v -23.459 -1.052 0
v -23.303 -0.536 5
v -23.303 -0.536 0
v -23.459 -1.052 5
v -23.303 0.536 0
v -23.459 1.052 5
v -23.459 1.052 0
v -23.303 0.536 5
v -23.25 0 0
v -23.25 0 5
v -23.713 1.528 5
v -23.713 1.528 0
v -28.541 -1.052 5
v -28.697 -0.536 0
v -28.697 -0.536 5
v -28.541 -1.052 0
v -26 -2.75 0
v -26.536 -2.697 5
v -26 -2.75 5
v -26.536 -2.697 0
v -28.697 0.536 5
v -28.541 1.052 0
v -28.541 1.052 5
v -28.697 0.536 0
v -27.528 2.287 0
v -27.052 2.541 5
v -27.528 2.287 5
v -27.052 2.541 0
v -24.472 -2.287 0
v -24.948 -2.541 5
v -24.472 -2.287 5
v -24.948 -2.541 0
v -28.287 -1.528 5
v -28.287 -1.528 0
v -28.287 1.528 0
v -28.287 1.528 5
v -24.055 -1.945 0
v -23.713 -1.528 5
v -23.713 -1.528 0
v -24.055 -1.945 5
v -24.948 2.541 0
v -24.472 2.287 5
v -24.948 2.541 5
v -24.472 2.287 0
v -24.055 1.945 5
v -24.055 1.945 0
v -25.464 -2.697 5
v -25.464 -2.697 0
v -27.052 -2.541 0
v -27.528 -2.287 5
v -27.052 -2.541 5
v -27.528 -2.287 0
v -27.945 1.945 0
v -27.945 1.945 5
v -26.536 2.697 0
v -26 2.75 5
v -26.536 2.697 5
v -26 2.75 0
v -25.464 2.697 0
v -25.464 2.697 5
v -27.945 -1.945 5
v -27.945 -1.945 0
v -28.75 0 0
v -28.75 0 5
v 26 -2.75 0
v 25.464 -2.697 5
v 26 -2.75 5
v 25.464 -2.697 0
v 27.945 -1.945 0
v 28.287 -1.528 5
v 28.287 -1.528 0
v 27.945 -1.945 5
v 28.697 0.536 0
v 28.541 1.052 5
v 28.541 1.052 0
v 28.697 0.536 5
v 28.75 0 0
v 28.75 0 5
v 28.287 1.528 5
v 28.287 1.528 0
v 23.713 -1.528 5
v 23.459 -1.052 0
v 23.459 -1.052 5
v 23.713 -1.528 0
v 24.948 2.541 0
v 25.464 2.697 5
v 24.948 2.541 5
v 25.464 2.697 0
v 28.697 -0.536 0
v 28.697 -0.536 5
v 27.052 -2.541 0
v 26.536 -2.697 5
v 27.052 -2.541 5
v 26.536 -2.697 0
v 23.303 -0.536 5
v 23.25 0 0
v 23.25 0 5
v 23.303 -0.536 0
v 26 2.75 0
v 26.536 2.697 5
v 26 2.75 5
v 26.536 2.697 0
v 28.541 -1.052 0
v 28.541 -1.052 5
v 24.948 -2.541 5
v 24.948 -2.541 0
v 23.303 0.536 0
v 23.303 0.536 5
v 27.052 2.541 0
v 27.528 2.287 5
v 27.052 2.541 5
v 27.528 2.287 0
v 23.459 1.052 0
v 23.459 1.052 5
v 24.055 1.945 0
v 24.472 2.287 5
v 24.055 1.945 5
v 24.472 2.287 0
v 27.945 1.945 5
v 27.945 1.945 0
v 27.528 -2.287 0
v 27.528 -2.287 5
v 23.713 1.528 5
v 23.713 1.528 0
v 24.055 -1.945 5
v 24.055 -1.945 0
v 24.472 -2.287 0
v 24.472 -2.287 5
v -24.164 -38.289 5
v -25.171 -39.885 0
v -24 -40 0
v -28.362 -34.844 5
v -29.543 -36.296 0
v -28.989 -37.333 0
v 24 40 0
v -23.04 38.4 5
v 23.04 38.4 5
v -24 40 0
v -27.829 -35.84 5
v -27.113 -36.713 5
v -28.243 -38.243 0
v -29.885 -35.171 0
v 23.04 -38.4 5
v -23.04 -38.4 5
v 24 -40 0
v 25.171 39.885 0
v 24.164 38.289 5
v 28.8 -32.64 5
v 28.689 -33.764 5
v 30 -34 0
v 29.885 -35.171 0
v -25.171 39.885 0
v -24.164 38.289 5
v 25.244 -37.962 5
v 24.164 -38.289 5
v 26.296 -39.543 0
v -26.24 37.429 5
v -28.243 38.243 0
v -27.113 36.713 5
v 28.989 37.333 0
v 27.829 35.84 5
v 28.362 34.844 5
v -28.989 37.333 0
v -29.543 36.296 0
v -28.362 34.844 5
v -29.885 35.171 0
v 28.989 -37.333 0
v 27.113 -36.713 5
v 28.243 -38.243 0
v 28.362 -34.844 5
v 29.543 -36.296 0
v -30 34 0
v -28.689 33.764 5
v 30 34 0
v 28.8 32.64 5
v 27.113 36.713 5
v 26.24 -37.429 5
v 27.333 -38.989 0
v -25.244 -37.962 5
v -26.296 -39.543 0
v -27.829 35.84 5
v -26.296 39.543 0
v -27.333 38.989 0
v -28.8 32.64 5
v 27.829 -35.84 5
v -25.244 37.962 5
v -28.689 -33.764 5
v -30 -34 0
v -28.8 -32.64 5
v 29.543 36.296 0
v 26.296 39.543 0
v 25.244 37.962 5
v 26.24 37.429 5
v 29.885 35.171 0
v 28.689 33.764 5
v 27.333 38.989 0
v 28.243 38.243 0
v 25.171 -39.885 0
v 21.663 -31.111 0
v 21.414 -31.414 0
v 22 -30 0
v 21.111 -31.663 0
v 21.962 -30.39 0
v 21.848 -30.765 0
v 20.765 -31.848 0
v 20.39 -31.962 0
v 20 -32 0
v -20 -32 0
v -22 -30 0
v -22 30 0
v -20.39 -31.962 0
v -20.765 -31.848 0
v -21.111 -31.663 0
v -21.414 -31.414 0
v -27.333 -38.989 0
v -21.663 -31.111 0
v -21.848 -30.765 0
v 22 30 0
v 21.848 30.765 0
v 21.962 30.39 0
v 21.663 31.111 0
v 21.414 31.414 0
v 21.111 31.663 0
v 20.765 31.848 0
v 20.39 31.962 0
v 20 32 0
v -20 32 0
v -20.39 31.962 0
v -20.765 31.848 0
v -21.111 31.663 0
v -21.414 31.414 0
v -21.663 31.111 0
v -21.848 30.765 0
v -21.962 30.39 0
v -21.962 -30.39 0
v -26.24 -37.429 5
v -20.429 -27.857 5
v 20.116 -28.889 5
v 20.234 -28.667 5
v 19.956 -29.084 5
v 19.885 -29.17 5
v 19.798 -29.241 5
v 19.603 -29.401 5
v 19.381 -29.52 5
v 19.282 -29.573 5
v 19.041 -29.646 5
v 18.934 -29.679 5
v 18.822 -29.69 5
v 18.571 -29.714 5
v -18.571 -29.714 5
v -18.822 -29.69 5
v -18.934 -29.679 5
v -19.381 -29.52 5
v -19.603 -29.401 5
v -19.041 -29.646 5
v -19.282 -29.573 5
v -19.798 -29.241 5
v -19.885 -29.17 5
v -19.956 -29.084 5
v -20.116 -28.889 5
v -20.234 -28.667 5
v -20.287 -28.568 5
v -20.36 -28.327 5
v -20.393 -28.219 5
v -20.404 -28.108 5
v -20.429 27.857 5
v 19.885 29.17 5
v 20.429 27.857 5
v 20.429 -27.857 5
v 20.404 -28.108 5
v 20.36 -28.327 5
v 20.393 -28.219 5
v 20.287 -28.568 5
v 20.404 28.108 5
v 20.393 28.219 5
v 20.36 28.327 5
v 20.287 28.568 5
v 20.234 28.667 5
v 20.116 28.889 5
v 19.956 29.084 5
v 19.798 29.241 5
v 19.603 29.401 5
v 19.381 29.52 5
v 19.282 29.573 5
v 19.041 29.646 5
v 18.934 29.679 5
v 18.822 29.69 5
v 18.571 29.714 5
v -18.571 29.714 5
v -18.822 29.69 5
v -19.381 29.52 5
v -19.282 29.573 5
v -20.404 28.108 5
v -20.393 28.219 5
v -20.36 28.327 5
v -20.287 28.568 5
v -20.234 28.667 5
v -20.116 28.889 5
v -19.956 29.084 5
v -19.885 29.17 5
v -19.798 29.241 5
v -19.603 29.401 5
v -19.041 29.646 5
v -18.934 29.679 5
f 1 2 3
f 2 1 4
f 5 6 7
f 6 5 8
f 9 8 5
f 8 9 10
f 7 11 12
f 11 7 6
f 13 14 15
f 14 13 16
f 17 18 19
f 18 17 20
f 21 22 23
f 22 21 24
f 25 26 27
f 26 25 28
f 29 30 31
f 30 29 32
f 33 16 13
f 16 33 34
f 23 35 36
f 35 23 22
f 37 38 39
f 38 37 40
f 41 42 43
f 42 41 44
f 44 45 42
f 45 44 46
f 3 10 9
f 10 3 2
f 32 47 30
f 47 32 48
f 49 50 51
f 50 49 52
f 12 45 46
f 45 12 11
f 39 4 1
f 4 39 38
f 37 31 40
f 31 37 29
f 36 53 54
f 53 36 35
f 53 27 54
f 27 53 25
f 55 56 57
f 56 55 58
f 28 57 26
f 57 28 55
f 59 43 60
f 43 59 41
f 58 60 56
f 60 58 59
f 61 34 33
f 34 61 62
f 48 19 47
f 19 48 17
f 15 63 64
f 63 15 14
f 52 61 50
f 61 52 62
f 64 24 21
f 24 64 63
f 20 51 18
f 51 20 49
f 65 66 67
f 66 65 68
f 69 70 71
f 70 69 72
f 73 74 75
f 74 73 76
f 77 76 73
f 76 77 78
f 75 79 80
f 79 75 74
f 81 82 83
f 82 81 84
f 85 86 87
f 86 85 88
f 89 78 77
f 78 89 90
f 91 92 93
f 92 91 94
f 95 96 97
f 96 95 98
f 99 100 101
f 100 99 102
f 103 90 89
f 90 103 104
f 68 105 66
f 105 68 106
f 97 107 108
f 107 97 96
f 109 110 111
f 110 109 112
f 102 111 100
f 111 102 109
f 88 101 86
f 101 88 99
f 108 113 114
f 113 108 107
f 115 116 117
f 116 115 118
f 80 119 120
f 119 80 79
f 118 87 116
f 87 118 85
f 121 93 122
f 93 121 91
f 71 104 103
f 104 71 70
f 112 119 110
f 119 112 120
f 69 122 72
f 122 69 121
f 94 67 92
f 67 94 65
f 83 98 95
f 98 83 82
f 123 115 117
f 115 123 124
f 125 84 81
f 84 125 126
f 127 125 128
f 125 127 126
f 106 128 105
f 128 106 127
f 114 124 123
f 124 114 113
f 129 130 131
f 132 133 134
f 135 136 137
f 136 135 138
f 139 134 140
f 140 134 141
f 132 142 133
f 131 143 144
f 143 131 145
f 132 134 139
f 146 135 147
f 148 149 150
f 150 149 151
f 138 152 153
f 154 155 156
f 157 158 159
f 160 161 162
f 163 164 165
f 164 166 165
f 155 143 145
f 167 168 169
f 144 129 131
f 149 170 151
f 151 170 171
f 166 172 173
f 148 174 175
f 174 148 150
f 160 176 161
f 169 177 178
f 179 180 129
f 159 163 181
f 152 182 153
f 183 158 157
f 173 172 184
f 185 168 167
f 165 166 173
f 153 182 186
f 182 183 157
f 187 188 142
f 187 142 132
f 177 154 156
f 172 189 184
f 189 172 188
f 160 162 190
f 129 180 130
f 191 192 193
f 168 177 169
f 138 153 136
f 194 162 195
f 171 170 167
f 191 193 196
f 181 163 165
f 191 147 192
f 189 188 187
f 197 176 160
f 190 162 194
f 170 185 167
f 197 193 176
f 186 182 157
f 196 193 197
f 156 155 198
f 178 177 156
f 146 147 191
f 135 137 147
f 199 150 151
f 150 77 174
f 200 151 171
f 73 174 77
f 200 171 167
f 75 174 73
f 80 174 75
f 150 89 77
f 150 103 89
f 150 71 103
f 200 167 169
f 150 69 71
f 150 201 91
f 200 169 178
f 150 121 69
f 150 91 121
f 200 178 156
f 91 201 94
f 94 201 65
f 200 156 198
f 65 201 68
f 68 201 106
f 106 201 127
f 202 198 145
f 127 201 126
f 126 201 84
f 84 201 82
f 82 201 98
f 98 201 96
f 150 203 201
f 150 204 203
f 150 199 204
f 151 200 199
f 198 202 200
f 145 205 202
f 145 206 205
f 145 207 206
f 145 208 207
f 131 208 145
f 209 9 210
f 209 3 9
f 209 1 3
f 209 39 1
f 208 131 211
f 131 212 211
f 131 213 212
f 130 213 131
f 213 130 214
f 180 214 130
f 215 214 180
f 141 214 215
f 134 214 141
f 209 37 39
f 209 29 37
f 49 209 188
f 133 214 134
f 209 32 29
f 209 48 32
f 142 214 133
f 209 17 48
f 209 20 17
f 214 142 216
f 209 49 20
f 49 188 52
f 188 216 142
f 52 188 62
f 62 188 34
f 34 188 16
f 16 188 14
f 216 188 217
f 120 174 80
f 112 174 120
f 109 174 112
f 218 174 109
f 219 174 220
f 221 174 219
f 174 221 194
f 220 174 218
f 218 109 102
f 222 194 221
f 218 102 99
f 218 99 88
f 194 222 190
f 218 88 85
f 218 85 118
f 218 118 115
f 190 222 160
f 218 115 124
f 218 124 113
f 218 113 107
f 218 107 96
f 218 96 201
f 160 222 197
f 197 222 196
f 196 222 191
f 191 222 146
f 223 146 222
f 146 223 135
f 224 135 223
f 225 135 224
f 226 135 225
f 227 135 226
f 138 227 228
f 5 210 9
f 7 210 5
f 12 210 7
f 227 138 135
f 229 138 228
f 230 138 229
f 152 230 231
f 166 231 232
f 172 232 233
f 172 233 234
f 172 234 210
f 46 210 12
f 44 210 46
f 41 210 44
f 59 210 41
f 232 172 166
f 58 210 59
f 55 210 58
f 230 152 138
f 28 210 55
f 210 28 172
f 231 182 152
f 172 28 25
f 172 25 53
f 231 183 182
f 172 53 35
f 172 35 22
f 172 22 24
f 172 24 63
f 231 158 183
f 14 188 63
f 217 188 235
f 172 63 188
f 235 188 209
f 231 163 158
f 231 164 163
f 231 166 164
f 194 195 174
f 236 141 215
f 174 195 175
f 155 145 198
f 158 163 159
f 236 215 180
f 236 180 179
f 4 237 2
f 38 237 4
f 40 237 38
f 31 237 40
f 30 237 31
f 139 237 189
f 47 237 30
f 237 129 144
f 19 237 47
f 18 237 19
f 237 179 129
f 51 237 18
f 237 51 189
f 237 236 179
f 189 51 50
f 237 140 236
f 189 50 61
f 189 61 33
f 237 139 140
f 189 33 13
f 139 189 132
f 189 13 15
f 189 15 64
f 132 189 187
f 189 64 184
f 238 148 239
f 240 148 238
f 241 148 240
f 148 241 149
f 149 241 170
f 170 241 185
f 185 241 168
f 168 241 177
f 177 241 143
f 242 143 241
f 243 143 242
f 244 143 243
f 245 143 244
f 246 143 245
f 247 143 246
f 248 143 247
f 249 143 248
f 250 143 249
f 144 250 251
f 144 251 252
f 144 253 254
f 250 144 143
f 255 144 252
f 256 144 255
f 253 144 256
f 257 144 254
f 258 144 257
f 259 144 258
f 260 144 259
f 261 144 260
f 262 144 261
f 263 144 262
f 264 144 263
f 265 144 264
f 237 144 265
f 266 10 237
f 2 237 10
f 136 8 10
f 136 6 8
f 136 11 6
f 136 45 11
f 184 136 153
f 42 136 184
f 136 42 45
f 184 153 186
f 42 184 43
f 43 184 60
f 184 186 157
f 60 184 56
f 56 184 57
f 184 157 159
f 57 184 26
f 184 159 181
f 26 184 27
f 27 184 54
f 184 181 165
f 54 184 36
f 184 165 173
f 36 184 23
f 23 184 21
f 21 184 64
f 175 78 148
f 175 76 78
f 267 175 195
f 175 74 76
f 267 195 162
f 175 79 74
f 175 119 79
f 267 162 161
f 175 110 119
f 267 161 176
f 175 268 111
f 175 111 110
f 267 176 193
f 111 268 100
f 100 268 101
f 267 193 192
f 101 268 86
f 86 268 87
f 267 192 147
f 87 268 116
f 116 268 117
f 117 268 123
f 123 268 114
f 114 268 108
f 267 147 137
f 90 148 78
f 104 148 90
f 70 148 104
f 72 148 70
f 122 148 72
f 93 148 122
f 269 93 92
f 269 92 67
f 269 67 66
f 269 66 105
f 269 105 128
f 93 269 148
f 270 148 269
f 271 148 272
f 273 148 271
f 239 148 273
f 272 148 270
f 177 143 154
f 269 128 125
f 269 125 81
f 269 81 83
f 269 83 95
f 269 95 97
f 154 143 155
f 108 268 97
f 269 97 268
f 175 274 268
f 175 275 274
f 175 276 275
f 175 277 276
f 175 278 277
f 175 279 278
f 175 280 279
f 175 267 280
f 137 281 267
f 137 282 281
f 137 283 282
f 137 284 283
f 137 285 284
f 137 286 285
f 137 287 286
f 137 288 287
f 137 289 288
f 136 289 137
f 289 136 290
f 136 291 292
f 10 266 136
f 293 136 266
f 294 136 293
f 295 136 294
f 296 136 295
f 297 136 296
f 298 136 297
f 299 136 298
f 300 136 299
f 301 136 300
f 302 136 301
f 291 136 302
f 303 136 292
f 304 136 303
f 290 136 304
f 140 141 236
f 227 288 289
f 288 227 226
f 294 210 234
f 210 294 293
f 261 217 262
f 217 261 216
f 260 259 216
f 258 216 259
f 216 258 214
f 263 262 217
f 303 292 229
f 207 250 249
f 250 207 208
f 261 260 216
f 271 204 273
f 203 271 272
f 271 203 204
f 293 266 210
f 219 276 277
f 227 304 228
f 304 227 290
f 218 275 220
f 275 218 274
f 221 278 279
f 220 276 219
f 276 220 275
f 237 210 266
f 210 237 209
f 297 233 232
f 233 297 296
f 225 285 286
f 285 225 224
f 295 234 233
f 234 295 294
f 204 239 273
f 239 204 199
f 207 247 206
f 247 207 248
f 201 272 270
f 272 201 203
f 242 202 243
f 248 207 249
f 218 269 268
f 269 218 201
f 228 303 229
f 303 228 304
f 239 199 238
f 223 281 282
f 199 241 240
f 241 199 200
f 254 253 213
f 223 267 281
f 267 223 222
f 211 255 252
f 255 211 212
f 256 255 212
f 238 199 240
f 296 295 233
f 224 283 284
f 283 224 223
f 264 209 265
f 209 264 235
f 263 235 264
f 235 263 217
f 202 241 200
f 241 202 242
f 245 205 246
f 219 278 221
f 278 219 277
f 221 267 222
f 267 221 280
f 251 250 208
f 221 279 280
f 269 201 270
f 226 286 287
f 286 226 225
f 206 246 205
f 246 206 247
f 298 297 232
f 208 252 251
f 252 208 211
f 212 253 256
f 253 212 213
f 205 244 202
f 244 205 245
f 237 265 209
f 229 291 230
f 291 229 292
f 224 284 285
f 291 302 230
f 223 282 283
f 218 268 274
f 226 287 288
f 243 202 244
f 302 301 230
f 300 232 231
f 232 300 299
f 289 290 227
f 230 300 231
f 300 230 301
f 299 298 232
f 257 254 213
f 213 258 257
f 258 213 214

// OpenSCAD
$fn = 32;

// ----------------------------------------------------------------------
// Display bezel: 60 x 80 mm frame, opening 44x64 mm
// ----------------------------------------------------------------------

// --- parameters (mm) ---
length = 60;              // frame outside length, X
width = 80;               // frame outside width, Y
frame_w = 8;              // frame width
thickness = 5;            // frame thickness
corner_r = 6;             // outside corner radius
chamfer = 0.96;           // outer wall taper
funnel = 0.9;             // inner opening taper
opening_l = 44;           // opening length
opening_w = 64;           // opening width
inner_r = 2;              // opening corner radius
hole_d = 5.5;             // mounting screw clearance
holes_per_side = 1;       // holes per short side
hole_inset = 4;           // hole centre inset from the outside edge

/* rounded-rectangle outlines, generated with loops */
module rounded_ring(l_nom, w_nom, r) {
  hull() {
    for (sx = [-1, 1]) for (sy = [-1, 1])
      translate([sx * (l_nom / 2 - r), sy * (w_nom / 2 - r)]) circle(r = r);
  }
}

difference() {
  /* frame body, drafted so the outer edge is a variable-depth chamfer */
  linear_extrude(height = thickness, scale = chamfer)
    rounded_ring(length, width, corner_r);
  /* viewing opening, drafted the other way for a funnel edge */
  linear_extrude(height = thickness + 2, scale = funnel)
    translate([0, 0, -1]) rounded_ring(opening_l, opening_w, inner_r);
  /* mounting screws through the frame lands */
  for (sx = [-1, 1]) for (i = [1 : holes_per_side])
    translate([sx * (length / 2 - hole_inset),
               (i - (holes_per_side + 1) / 2) * width * 0.5, -1])
      cylinder(h = thickness + 2, d = hole_d);
}
